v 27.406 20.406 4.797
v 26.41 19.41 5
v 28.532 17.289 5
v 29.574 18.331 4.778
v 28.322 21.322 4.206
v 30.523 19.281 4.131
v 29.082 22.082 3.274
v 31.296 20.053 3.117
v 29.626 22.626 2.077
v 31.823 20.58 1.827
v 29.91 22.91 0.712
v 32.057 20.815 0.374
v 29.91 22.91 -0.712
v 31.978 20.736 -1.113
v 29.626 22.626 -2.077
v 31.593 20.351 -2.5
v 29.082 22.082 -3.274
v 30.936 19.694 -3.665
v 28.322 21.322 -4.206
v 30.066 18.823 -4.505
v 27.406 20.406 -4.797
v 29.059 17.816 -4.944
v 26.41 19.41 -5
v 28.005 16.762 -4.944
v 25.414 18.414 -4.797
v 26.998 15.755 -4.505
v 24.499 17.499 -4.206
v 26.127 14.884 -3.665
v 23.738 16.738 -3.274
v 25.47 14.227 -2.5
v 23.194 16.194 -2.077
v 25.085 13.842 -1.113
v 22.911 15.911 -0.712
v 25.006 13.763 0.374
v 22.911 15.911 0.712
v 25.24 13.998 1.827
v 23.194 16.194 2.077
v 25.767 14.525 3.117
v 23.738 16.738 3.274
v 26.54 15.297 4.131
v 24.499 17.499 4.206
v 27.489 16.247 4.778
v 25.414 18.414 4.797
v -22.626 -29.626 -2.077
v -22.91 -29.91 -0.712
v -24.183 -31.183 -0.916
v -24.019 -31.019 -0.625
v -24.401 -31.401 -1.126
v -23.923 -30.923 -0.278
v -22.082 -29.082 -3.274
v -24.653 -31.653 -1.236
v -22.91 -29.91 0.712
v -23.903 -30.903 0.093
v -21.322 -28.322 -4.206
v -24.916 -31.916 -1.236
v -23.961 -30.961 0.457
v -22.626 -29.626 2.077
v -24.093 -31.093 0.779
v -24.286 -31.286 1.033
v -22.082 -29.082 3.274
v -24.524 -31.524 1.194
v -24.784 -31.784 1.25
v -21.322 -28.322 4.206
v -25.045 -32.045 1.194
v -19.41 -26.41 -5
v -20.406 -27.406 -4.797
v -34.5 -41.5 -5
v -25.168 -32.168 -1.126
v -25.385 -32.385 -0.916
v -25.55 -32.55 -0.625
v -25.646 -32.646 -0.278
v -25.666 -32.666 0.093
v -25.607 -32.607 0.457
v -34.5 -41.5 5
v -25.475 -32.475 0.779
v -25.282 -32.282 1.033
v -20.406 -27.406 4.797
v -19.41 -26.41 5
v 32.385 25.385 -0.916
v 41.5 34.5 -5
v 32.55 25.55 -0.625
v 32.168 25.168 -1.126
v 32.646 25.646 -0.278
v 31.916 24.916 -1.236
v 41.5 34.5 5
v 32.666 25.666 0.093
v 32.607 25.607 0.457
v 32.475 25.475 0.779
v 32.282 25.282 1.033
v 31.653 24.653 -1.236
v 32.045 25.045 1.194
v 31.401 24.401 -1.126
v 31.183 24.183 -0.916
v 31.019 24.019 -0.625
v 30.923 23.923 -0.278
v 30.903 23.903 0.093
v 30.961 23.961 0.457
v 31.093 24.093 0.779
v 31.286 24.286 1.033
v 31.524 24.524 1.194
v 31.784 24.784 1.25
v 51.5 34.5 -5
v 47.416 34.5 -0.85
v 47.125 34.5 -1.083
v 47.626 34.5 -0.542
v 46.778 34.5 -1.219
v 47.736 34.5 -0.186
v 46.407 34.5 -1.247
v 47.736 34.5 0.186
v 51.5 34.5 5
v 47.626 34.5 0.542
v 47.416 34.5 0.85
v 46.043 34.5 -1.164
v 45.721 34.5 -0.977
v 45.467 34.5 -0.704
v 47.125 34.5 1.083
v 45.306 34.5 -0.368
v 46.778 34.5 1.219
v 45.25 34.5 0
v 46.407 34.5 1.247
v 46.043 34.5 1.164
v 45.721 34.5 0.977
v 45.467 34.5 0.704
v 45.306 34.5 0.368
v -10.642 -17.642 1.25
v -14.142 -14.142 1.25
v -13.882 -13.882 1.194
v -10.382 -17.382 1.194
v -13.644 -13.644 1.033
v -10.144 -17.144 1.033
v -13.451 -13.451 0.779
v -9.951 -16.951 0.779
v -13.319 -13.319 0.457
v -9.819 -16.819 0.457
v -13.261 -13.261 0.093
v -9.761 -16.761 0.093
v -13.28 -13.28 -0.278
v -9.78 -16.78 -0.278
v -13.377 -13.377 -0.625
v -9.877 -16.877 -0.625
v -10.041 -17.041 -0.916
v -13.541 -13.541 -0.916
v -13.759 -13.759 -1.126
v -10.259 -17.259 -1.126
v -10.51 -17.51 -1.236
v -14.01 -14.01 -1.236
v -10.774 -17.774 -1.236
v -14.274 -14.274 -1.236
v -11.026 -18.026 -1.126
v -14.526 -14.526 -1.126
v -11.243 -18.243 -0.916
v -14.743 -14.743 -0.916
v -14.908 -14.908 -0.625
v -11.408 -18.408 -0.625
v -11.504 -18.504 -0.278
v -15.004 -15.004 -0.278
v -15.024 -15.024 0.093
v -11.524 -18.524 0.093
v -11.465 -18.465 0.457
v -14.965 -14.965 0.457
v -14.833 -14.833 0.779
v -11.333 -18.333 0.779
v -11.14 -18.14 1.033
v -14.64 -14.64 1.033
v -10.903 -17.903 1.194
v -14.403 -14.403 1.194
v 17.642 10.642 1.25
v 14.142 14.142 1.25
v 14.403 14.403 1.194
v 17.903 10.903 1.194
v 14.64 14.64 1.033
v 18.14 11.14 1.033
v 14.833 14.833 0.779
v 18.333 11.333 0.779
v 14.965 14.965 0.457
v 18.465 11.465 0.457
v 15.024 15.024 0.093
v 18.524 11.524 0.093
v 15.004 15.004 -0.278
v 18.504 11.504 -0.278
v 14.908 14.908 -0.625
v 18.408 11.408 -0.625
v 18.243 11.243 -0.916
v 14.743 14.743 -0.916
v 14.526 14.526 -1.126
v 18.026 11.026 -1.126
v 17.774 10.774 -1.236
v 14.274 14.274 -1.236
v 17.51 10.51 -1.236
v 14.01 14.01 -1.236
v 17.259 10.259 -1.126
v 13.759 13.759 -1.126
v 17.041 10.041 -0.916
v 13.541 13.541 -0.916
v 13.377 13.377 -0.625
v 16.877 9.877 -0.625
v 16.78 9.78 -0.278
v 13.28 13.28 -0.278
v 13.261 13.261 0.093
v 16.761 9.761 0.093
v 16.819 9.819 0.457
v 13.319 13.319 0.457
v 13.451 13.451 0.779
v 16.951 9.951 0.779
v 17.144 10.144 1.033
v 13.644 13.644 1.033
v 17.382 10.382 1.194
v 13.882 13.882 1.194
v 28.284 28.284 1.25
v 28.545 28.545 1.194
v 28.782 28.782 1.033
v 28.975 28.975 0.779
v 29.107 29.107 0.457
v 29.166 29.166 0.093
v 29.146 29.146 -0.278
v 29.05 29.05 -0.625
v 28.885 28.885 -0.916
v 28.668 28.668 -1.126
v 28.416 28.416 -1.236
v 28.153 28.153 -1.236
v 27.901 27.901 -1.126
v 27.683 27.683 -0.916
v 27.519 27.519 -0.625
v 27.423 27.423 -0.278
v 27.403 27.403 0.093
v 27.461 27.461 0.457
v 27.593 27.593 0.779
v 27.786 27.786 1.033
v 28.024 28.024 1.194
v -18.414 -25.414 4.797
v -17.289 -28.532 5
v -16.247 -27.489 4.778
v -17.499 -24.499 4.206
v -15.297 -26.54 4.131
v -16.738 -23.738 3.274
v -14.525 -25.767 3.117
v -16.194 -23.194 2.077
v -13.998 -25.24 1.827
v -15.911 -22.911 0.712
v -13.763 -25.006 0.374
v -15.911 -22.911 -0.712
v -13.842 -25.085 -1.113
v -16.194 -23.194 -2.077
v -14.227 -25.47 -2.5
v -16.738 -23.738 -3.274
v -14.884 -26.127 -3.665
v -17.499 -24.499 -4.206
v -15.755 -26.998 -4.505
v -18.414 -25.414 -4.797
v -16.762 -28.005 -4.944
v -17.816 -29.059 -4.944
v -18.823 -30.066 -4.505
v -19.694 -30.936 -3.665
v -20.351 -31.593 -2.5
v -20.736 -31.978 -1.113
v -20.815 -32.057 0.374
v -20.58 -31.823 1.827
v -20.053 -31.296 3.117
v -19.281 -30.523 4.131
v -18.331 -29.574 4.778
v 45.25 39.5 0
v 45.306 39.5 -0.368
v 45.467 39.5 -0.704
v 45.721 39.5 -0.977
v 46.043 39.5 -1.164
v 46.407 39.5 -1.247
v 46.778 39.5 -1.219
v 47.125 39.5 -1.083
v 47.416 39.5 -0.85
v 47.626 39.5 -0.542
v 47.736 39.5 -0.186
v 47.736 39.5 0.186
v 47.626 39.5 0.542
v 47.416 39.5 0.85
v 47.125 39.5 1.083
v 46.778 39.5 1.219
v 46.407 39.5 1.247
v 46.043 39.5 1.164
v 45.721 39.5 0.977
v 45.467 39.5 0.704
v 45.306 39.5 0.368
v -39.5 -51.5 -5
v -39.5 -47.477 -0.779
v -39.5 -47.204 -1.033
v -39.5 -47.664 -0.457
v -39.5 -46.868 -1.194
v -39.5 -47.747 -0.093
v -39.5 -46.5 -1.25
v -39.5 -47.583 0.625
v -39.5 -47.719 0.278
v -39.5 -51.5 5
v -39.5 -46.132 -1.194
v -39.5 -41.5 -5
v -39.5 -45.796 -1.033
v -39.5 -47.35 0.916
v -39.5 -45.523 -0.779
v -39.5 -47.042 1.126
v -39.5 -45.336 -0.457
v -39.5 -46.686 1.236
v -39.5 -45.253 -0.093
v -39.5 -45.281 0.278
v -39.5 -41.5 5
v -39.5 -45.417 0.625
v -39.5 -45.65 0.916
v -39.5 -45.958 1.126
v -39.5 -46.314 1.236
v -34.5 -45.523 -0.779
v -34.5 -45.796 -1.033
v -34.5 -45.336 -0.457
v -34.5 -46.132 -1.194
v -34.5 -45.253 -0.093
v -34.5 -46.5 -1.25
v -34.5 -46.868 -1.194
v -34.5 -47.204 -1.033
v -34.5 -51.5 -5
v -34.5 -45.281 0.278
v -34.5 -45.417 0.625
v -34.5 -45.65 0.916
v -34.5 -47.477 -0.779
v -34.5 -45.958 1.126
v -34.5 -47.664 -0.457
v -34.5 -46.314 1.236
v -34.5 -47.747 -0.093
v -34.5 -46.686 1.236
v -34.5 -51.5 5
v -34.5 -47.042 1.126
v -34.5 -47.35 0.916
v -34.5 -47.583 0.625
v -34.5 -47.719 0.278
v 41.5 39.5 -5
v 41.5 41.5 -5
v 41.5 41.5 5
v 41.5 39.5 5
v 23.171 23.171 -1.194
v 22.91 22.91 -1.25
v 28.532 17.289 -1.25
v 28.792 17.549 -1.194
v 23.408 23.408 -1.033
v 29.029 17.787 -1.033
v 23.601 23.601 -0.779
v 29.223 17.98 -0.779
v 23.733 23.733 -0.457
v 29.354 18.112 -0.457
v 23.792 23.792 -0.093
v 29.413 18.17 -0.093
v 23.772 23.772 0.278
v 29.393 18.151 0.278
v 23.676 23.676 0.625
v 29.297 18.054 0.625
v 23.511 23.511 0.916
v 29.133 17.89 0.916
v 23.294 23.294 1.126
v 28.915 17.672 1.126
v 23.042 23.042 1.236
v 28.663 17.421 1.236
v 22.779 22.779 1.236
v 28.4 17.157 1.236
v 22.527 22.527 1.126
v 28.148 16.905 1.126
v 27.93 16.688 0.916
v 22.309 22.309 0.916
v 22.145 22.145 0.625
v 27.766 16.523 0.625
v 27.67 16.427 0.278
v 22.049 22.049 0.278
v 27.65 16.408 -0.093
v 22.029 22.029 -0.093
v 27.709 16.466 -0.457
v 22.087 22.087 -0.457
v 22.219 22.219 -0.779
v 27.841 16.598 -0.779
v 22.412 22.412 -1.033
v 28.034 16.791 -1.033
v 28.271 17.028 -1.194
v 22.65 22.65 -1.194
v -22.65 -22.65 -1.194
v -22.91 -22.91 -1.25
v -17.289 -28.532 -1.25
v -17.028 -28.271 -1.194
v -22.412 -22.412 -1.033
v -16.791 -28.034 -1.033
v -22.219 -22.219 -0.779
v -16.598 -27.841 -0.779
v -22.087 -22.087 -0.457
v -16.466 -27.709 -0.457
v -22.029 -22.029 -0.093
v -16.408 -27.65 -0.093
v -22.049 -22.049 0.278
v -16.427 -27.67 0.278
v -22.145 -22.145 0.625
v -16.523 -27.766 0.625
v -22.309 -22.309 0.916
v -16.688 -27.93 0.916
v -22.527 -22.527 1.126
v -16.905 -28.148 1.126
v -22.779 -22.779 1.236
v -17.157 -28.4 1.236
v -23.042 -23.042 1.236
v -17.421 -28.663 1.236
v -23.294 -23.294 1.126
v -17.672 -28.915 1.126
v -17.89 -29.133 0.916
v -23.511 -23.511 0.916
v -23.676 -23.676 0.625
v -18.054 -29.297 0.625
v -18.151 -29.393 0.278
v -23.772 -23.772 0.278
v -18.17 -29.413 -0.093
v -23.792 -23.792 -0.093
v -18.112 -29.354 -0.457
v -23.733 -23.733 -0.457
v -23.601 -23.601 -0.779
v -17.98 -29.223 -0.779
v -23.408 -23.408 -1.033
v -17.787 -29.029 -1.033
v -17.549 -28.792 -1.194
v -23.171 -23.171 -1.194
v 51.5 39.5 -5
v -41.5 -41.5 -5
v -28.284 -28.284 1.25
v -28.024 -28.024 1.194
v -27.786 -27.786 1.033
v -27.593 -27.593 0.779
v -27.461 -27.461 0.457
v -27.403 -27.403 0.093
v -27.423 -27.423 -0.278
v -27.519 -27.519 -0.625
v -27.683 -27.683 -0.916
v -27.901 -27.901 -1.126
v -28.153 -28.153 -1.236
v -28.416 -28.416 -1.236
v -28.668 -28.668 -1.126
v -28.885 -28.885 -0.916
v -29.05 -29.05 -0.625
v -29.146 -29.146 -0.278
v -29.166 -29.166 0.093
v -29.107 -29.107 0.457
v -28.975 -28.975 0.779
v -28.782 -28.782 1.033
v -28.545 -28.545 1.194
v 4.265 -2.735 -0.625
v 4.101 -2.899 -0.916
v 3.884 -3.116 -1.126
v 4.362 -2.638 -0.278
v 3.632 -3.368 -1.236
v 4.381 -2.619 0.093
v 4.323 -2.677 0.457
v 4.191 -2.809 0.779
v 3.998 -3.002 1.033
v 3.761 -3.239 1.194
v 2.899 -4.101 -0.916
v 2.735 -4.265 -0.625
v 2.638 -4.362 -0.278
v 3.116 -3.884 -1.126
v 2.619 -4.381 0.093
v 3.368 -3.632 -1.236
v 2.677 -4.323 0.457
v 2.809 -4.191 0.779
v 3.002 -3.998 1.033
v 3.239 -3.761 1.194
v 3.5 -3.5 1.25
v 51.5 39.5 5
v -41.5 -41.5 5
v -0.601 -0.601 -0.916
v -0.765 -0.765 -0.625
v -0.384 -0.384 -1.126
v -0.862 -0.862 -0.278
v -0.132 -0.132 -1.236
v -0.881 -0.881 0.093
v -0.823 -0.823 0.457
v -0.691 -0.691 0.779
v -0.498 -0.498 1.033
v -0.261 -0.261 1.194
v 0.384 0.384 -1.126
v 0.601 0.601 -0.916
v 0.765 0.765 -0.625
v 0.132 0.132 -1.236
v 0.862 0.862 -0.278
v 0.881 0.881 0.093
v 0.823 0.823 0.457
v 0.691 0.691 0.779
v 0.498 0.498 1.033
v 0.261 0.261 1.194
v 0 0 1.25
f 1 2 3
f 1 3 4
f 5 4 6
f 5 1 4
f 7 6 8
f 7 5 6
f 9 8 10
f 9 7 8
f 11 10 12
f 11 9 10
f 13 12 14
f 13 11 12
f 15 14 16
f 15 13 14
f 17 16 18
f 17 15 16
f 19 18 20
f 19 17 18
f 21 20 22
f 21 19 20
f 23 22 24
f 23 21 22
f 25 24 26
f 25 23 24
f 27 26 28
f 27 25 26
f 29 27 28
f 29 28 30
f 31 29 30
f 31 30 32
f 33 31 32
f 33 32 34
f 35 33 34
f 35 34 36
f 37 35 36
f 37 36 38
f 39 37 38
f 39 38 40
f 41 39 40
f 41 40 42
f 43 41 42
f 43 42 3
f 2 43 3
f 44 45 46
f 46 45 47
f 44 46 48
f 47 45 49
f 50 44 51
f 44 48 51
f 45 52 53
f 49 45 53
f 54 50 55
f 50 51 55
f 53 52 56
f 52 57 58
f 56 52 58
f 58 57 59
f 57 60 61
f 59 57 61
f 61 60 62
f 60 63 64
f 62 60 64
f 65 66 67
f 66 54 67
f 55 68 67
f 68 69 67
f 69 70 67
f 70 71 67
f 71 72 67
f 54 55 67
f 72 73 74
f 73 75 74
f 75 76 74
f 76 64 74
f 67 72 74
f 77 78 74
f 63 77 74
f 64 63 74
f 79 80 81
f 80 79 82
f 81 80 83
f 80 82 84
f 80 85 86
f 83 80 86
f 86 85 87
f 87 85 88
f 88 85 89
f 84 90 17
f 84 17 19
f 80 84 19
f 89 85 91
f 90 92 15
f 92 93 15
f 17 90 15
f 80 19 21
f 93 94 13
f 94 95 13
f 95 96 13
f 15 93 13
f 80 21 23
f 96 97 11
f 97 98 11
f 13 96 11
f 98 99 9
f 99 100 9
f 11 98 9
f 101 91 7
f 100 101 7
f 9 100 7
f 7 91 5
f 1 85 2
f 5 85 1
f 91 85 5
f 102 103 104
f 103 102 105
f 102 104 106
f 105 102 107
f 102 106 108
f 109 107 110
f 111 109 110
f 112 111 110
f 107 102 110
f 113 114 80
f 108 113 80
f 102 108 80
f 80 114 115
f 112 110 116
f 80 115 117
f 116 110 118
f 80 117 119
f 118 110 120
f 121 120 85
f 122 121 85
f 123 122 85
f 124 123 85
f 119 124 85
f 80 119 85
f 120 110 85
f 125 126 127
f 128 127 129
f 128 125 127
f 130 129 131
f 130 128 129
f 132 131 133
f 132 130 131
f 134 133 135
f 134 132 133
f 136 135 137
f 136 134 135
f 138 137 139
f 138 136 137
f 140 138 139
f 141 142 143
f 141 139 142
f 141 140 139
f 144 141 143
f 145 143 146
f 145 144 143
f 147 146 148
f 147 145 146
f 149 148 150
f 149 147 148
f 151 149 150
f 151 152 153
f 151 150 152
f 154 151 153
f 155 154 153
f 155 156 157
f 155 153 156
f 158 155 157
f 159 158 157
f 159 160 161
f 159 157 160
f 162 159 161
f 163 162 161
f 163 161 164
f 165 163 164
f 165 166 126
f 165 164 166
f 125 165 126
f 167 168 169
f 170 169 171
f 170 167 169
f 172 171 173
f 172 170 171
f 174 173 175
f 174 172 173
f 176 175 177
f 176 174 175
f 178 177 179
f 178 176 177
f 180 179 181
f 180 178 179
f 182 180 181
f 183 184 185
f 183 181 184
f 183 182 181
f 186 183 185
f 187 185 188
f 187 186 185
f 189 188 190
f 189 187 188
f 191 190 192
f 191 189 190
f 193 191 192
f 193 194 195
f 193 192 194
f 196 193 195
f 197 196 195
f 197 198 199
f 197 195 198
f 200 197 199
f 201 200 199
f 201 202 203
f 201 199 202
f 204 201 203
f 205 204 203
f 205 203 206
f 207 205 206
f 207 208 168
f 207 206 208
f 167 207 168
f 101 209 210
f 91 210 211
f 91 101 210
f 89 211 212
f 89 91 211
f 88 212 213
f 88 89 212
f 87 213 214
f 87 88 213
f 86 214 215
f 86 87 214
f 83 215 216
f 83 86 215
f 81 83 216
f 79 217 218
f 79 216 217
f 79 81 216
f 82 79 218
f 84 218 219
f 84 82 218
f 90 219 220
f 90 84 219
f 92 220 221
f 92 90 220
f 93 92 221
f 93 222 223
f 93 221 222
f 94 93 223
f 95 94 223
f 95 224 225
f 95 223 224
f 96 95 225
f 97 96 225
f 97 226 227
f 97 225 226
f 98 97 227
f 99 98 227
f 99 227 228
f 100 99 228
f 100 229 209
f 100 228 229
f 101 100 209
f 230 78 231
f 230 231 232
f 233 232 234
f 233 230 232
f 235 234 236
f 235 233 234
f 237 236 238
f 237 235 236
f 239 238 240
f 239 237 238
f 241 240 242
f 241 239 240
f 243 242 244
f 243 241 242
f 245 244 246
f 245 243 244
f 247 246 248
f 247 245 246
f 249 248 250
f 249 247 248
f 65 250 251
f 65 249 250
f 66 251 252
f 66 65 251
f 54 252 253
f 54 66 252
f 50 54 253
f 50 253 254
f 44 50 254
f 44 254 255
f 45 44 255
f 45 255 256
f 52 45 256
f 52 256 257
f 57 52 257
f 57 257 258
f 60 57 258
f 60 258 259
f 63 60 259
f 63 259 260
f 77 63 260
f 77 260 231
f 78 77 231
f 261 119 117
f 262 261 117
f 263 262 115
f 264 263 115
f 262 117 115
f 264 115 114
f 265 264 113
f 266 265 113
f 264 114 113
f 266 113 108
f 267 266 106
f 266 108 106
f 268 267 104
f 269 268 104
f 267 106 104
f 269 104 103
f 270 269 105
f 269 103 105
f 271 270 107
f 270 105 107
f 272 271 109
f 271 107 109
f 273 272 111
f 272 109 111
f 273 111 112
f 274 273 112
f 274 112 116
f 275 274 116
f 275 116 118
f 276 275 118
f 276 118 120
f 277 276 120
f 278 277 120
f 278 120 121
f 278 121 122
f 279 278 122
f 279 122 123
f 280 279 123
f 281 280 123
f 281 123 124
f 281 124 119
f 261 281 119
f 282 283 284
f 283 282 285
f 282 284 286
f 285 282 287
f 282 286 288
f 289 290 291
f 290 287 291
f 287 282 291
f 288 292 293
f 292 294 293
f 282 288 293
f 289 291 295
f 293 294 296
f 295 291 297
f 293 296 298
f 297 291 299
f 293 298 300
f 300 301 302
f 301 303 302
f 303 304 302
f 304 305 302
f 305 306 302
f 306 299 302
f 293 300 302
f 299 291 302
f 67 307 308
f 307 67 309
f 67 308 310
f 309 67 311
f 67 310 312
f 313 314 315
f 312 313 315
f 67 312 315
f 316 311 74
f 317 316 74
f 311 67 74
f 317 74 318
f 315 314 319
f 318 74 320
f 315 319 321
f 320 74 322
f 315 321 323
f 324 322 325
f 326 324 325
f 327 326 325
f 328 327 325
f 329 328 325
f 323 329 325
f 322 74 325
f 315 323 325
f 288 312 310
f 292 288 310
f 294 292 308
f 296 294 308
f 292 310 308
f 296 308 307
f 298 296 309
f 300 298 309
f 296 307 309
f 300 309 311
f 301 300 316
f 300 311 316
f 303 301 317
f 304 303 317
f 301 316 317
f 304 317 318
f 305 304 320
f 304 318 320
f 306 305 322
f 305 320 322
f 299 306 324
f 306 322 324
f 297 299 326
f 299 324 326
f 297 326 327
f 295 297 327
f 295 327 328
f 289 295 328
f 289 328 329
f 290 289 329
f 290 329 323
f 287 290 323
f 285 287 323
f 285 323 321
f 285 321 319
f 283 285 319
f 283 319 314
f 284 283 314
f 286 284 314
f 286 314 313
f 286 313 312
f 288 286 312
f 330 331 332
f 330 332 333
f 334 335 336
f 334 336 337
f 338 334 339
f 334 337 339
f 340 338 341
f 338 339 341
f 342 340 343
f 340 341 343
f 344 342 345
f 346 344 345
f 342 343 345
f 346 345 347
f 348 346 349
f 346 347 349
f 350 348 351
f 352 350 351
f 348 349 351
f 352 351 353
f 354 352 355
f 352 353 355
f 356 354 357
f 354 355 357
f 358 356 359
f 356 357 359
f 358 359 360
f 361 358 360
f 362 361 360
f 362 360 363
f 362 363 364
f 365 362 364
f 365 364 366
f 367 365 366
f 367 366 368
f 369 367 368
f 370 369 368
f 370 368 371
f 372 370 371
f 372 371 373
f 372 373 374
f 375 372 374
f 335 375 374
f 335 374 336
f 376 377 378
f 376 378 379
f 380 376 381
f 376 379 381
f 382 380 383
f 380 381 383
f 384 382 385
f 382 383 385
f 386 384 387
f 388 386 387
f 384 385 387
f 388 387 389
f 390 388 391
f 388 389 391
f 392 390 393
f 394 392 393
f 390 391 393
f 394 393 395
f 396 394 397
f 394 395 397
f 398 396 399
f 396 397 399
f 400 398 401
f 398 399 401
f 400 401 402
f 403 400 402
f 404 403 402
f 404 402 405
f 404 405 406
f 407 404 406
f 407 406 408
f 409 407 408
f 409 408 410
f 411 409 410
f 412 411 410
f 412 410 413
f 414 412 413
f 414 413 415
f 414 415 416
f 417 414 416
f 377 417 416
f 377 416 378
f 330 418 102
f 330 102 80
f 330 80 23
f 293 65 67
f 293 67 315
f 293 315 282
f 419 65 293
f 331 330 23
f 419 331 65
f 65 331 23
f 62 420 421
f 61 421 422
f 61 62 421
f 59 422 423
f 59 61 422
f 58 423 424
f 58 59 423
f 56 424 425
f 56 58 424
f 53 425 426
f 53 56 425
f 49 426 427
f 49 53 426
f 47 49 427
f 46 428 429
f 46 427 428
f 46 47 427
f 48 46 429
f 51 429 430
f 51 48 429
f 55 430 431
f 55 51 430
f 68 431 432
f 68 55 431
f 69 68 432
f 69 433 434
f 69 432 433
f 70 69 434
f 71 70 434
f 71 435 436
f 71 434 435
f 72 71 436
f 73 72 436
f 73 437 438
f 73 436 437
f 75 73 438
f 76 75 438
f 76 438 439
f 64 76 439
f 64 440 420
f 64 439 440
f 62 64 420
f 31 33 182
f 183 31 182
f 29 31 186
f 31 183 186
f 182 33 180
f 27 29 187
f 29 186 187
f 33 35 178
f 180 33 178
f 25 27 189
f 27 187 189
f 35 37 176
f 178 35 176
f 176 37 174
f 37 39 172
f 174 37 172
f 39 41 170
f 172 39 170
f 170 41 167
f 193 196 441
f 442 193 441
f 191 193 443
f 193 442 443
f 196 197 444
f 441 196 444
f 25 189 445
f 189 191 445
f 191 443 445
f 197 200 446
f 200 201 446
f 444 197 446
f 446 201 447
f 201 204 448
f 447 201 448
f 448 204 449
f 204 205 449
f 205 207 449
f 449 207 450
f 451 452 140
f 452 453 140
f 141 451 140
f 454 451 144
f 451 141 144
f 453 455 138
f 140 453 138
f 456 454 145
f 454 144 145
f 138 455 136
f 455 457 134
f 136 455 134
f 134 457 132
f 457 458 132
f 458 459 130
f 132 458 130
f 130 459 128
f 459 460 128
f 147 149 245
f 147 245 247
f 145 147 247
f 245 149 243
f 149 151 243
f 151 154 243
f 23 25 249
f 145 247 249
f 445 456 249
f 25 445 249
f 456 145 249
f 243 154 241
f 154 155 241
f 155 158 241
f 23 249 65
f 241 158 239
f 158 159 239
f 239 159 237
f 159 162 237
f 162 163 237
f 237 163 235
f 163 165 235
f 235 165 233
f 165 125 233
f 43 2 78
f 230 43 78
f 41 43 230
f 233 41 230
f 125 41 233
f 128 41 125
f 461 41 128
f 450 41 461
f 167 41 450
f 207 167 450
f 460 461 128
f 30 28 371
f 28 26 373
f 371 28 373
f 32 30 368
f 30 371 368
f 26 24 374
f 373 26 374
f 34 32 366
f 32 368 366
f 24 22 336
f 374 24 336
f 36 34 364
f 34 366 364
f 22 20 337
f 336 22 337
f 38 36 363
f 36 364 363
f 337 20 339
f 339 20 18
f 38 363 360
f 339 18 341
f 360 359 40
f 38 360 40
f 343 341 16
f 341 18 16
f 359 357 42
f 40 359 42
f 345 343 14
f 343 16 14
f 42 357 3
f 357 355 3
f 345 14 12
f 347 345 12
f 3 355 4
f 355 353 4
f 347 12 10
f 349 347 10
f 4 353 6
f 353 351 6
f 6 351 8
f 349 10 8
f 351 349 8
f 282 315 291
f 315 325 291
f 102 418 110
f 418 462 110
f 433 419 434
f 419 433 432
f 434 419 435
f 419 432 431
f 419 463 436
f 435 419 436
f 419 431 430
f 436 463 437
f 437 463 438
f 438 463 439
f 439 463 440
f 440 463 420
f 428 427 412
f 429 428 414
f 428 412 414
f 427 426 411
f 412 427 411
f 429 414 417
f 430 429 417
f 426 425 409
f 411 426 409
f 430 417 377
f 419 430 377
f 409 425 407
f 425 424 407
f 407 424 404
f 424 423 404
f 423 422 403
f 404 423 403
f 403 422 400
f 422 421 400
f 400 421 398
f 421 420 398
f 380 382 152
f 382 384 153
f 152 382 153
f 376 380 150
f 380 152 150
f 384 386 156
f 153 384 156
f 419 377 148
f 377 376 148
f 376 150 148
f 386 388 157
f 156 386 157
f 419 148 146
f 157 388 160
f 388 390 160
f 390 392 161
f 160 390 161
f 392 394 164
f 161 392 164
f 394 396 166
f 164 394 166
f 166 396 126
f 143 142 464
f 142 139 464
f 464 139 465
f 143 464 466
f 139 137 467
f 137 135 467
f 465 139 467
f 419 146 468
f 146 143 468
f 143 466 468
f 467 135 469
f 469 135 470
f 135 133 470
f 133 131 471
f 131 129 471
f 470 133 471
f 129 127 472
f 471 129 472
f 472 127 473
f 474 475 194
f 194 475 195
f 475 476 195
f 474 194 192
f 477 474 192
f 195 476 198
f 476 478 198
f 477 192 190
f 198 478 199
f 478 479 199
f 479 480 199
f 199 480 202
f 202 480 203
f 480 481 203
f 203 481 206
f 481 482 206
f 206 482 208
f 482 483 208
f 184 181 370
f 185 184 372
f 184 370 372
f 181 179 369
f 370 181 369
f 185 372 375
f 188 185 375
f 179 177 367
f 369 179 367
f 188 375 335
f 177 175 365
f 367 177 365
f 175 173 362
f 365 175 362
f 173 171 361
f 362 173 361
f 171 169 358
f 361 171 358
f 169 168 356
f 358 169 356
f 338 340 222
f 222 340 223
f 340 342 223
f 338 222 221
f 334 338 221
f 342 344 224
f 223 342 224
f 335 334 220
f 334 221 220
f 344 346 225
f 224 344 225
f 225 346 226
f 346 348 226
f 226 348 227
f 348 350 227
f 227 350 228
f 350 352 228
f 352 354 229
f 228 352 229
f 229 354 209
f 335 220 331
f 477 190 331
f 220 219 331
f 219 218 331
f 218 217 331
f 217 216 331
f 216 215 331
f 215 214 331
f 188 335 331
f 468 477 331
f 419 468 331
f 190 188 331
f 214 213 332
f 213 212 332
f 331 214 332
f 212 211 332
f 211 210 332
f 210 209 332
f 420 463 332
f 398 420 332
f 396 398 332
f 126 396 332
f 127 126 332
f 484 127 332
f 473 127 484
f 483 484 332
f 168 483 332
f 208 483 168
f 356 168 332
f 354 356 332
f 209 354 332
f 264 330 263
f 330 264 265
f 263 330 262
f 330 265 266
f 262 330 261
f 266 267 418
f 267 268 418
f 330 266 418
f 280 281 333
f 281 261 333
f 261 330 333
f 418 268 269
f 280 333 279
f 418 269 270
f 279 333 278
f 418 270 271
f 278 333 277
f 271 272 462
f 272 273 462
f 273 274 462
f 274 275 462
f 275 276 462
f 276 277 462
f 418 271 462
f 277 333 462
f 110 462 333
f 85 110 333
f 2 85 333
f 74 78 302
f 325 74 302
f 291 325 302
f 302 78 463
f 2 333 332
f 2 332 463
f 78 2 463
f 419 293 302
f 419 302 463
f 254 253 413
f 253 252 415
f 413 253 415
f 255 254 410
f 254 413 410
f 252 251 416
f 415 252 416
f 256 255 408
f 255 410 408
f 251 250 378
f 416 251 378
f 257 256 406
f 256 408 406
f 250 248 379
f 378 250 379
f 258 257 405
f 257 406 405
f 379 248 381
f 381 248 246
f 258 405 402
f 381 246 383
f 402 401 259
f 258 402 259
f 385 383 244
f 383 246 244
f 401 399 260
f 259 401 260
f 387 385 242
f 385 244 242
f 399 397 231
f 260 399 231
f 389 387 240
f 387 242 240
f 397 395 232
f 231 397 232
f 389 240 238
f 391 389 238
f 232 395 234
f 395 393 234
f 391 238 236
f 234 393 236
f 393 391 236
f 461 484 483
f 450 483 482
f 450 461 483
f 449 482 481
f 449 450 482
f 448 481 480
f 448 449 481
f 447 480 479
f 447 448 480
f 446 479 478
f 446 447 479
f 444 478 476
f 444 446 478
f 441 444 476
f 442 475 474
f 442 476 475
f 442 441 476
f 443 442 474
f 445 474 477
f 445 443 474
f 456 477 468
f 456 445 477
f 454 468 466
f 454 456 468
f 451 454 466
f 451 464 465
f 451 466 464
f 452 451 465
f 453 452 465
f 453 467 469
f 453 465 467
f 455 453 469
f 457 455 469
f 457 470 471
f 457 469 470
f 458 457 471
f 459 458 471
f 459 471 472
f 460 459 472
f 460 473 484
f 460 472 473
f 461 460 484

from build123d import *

# Parameters (mm, degrees)
MAIN_DEPTH          = 5
SKETCH2_R           = 1.25
FIXHOLE1_DEPTH      = 84
SKETCH3_R           = 1.25
FIXHOLE2_DEPTH      = 84
SKETCH6_R           = 1.25
CUT_EXTRUDE2_DEPTH  = 64.639610307
LPATTERN1_COUNT     = 5
LPATTERN1_PITCH     = 20
SKETCH7_R           = 5
BOSS_EXTRUDE1_DEPTH = 3
SKETCH8_R           = 1.25
CUT_EXTRUDE3_DEPTH  = 67.639610307


with BuildPart() as part:
    # Sketch1 → Main (new body, symmetric)
    with BuildSketch(Plane.XY):
        Polygon((-41.5, -41.5), (41.5, 41.5), (41.5, 39.5), (51.5, 39.5), (51.5, 34.5), (41.5, 34.5), (-34.5, -41.5), (-34.5, -51.5), (-39.5, -51.5), (-39.5, -41.5), align=None)
    extrude(amount=MAIN_DEPTH, both=True)

    # Sketch2 → FixHole1 (cut, through all)
    with BuildSketch(Plane(origin=(41.5, 0, 0), x_dir=(0, 0, -1), z_dir=(1, 0, 0))):
        with Locations((0, -46.5)):
            Circle(SKETCH2_R)
    extrude(amount=-FIXHOLE1_DEPTH, mode=Mode.SUBTRACT)

    # Sketch3 → FixHole2 (cut, through all)
    with BuildSketch(Plane(origin=(0, -41.5, 0), x_dir=(-1, 0, 0), z_dir=(0, -1, 0))):
        with Locations((-46.5, 0)):
            Circle(SKETCH3_R)
    extrude(amount=-FIXHOLE2_DEPTH, mode=Mode.SUBTRACT)

    # Sketch6 → Cut-Extrude2 (cut, through all)
    with BuildSketch(Plane(origin=(3.5, -3.5, 0), x_dir=(0, 0, 1), z_dir=(-0.707106781, 0.707106781, 0))):
        with Locations((0, 40)):
            Circle(SKETCH6_R)
    cut_extrude2 = extrude(amount=CUT_EXTRUDE2_DEPTH, mode=Mode.SUBTRACT)

    # LPattern1: Cut-Extrude2 ×5
    with Locations(*[Vector(-0.707106781, -0.707106781, 0) * (i * LPATTERN1_PITCH) for i in range(1, LPATTERN1_COUNT)]):
        add(cut_extrude2, mode=Mode.SUBTRACT)

    # Sketch7 → Boss-Extrude1 (add)
    with BuildSketch(Plane(origin=(3.5, -3.5, 0), x_dir=(0, 0, 1), z_dir=(-0.707106781, 0.707106781, 0))):
        with Locations((0, -32.4)):
            Circle(SKETCH7_R)
        with Locations((0, 32.4)):
            Circle(SKETCH7_R)
    extrude(amount=-BOSS_EXTRUDE1_DEPTH)

    # Sketch8 → Cut-Extrude3 (cut, through all)
    with BuildSketch(Plane(origin=(5.621320344, -5.621320344, 0), x_dir=(0, 0, -1), z_dir=(0.707106781, -0.707106781, 0))):
        with Locations((0, 32.4)):
            Circle(SKETCH8_R)
        with Locations((0, -32.4)):
            Circle(SKETCH8_R)
    extrude(amount=-CUT_EXTRUDE3_DEPTH, mode=Mode.SUBTRACT)


solid = part.part
